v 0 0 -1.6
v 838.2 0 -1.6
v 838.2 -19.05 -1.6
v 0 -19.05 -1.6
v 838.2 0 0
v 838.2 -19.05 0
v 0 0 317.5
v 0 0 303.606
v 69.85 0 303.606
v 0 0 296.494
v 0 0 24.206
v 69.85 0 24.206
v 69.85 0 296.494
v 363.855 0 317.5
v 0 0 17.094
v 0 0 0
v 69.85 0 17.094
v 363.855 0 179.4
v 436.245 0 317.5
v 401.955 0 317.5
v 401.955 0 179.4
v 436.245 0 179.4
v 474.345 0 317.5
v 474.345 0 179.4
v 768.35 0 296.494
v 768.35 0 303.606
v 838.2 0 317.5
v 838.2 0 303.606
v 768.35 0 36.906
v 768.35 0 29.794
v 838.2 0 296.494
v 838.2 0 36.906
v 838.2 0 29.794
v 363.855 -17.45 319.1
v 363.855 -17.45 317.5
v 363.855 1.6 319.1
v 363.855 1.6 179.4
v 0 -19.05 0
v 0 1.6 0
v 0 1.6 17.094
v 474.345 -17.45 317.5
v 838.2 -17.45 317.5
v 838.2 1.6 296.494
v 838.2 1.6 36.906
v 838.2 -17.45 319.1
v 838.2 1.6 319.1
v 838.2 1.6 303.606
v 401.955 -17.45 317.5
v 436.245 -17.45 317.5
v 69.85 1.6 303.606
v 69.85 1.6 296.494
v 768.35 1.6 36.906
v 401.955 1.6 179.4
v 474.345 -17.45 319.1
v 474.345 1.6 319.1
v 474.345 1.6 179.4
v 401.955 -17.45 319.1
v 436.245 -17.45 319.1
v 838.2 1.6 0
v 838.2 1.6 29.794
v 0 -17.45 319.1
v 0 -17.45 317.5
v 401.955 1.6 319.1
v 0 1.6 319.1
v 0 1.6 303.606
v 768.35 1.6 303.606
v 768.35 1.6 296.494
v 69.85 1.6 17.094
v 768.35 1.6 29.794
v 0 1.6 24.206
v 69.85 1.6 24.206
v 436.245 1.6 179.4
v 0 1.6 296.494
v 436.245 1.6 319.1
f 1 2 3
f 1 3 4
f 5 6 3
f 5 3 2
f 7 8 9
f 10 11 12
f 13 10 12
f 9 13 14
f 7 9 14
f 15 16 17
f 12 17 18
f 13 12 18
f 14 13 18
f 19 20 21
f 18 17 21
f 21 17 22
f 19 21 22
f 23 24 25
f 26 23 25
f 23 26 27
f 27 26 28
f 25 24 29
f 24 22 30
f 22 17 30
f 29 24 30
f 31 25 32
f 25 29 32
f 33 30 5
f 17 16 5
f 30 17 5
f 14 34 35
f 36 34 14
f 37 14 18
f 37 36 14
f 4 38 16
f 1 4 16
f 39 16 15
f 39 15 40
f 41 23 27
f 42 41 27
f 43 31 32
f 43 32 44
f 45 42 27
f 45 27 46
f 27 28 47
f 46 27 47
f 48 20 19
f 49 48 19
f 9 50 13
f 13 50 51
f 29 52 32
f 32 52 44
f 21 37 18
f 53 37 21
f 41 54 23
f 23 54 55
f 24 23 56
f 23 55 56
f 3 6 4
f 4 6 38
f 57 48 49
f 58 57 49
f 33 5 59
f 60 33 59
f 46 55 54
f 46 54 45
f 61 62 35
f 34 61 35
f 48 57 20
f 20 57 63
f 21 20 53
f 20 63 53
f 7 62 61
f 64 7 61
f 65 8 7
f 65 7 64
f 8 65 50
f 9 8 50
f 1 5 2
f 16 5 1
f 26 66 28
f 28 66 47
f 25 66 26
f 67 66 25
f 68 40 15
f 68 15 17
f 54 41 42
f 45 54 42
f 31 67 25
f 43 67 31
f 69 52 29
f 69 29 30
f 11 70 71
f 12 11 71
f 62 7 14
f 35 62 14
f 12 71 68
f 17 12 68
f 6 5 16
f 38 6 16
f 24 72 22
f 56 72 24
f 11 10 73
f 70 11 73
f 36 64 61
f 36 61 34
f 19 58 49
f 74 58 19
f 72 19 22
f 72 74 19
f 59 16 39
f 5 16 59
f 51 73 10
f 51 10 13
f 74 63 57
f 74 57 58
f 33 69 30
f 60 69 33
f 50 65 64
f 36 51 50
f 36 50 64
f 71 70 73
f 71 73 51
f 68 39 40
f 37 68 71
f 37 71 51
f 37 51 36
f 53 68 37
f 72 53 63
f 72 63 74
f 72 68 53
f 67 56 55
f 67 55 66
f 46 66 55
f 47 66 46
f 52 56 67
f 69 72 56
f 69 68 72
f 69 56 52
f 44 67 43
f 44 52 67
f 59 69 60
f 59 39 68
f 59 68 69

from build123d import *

# Parameters (mm, degrees)
SKETCH1_W           = 838.2
SKETCH1_H           = 317.5
BOSS_EXTRUDE1_DEPTH = 1.6002
SKETCH3_W           = 838.2
SKETCH3_H           = 19.05
BOSS_EXTRUDE2_DEPTH = 1.6002
CUT_EXTRUDE1_REACH  = 21.05
SKETCH2_W           = 38.1
SKETCH2_H           = 139.7
SKETCH4_W           = 838.2
SKETCH4_H           = 19.05
BOSS_EXTRUDE3_DEPTH = 1.6002
SKETCH5_W           = 69.85
SKETCH5_H           = 7.112
CUT_EXTRUDE2_DEPTH  = 1.6002


with BuildPart() as part:
    # Sketch1 → Boss-Extrude1 (new body)
    with BuildSketch(Plane(origin=(0, 0, 0), x_dir=(1, 0, 0), z_dir=(0, 1, 0))):
        with Locations((419.1, -158.75)):
            Rectangle(SKETCH1_W, SKETCH1_H)
    extrude(amount=BOSS_EXTRUDE1_DEPTH)

    # Sketch3 → Boss-Extrude2 (add)
    with BuildSketch(Plane.XY.offset(317.5)):
        with Locations((419.1, -7.9248)):
            Rectangle(SKETCH3_W, SKETCH3_H)
    extrude(amount=BOSS_EXTRUDE2_DEPTH)

    # Sketch2 → Cut-Extrude1 (cut, up to next)
    with BuildSketch(Plane(origin=(0, 1.6002, 0), x_dir=(1, 0, 0), z_dir=(0, 1, 0)), mode=Mode.PRIVATE) as cut_extrude1_sk1:
        with Locations((382.905, -249.2502)):
            Rectangle(SKETCH2_W, SKETCH2_H)
    cut_extrude1_tool1 = extrude(cut_extrude1_sk1.sketch, amount=-CUT_EXTRUDE1_REACH, mode=Mode.PRIVATE) & part.part
    add(cut_extrude1_tool1.solids().sort_by_distance((382.905, 1.6002, 249.2502))[0], mode=Mode.SUBTRACT)
    # Sketch2 → Cut-Extrude1 (cut, up to next)
    with BuildSketch(Plane(origin=(0, 1.6002, 0), x_dir=(1, 0, 0), z_dir=(0, 1, 0)), mode=Mode.PRIVATE) as cut_extrude1_sk2:
        with Locations((455.295, -249.2502)):
            Rectangle(SKETCH2_W, SKETCH2_H)
    cut_extrude1_tool2 = extrude(cut_extrude1_sk2.sketch, amount=-CUT_EXTRUDE1_REACH, mode=Mode.PRIVATE) & part.part
    add(cut_extrude1_tool2.solids().sort_by_distance((455.295, 1.6002, 249.2502))[0], mode=Mode.SUBTRACT)

    # Sketch5 → Cut-Extrude2 (cut)
    with BuildSketch(Plane(origin=(0, 1.6002, 0), x_dir=(1, 0, 0), z_dir=(0, 1, 0))):
        with Locations((34.925, -20.6502)):
            Rectangle(SKETCH5_W, SKETCH5_H)
        with Locations((34.925, -300.0502)):
            Rectangle(SKETCH5_W, SKETCH5_H)
        with Locations((803.275, -33.3502)):
            Rectangle(SKETCH5_W, SKETCH5_H)
        with Locations((803.275, -300.0502)):
            Rectangle(SKETCH5_W, SKETCH5_H)
    extrude(amount=-CUT_EXTRUDE2_DEPTH, mode=Mode.SUBTRACT)


with BuildPart() as body_2:
    # Sketch4 → Boss-Extrude3 (new body)
    with BuildSketch(Plane(origin=(0, 0, 0), x_dir=(-1, 0, 0), z_dir=(0, 0, -1))):
        with Locations((-419.1, -9.525)):
            Rectangle(SKETCH4_W, SKETCH4_H)
    extrude(amount=BOSS_EXTRUDE3_DEPTH)


solid = Compound([part.part, body_2.part])
